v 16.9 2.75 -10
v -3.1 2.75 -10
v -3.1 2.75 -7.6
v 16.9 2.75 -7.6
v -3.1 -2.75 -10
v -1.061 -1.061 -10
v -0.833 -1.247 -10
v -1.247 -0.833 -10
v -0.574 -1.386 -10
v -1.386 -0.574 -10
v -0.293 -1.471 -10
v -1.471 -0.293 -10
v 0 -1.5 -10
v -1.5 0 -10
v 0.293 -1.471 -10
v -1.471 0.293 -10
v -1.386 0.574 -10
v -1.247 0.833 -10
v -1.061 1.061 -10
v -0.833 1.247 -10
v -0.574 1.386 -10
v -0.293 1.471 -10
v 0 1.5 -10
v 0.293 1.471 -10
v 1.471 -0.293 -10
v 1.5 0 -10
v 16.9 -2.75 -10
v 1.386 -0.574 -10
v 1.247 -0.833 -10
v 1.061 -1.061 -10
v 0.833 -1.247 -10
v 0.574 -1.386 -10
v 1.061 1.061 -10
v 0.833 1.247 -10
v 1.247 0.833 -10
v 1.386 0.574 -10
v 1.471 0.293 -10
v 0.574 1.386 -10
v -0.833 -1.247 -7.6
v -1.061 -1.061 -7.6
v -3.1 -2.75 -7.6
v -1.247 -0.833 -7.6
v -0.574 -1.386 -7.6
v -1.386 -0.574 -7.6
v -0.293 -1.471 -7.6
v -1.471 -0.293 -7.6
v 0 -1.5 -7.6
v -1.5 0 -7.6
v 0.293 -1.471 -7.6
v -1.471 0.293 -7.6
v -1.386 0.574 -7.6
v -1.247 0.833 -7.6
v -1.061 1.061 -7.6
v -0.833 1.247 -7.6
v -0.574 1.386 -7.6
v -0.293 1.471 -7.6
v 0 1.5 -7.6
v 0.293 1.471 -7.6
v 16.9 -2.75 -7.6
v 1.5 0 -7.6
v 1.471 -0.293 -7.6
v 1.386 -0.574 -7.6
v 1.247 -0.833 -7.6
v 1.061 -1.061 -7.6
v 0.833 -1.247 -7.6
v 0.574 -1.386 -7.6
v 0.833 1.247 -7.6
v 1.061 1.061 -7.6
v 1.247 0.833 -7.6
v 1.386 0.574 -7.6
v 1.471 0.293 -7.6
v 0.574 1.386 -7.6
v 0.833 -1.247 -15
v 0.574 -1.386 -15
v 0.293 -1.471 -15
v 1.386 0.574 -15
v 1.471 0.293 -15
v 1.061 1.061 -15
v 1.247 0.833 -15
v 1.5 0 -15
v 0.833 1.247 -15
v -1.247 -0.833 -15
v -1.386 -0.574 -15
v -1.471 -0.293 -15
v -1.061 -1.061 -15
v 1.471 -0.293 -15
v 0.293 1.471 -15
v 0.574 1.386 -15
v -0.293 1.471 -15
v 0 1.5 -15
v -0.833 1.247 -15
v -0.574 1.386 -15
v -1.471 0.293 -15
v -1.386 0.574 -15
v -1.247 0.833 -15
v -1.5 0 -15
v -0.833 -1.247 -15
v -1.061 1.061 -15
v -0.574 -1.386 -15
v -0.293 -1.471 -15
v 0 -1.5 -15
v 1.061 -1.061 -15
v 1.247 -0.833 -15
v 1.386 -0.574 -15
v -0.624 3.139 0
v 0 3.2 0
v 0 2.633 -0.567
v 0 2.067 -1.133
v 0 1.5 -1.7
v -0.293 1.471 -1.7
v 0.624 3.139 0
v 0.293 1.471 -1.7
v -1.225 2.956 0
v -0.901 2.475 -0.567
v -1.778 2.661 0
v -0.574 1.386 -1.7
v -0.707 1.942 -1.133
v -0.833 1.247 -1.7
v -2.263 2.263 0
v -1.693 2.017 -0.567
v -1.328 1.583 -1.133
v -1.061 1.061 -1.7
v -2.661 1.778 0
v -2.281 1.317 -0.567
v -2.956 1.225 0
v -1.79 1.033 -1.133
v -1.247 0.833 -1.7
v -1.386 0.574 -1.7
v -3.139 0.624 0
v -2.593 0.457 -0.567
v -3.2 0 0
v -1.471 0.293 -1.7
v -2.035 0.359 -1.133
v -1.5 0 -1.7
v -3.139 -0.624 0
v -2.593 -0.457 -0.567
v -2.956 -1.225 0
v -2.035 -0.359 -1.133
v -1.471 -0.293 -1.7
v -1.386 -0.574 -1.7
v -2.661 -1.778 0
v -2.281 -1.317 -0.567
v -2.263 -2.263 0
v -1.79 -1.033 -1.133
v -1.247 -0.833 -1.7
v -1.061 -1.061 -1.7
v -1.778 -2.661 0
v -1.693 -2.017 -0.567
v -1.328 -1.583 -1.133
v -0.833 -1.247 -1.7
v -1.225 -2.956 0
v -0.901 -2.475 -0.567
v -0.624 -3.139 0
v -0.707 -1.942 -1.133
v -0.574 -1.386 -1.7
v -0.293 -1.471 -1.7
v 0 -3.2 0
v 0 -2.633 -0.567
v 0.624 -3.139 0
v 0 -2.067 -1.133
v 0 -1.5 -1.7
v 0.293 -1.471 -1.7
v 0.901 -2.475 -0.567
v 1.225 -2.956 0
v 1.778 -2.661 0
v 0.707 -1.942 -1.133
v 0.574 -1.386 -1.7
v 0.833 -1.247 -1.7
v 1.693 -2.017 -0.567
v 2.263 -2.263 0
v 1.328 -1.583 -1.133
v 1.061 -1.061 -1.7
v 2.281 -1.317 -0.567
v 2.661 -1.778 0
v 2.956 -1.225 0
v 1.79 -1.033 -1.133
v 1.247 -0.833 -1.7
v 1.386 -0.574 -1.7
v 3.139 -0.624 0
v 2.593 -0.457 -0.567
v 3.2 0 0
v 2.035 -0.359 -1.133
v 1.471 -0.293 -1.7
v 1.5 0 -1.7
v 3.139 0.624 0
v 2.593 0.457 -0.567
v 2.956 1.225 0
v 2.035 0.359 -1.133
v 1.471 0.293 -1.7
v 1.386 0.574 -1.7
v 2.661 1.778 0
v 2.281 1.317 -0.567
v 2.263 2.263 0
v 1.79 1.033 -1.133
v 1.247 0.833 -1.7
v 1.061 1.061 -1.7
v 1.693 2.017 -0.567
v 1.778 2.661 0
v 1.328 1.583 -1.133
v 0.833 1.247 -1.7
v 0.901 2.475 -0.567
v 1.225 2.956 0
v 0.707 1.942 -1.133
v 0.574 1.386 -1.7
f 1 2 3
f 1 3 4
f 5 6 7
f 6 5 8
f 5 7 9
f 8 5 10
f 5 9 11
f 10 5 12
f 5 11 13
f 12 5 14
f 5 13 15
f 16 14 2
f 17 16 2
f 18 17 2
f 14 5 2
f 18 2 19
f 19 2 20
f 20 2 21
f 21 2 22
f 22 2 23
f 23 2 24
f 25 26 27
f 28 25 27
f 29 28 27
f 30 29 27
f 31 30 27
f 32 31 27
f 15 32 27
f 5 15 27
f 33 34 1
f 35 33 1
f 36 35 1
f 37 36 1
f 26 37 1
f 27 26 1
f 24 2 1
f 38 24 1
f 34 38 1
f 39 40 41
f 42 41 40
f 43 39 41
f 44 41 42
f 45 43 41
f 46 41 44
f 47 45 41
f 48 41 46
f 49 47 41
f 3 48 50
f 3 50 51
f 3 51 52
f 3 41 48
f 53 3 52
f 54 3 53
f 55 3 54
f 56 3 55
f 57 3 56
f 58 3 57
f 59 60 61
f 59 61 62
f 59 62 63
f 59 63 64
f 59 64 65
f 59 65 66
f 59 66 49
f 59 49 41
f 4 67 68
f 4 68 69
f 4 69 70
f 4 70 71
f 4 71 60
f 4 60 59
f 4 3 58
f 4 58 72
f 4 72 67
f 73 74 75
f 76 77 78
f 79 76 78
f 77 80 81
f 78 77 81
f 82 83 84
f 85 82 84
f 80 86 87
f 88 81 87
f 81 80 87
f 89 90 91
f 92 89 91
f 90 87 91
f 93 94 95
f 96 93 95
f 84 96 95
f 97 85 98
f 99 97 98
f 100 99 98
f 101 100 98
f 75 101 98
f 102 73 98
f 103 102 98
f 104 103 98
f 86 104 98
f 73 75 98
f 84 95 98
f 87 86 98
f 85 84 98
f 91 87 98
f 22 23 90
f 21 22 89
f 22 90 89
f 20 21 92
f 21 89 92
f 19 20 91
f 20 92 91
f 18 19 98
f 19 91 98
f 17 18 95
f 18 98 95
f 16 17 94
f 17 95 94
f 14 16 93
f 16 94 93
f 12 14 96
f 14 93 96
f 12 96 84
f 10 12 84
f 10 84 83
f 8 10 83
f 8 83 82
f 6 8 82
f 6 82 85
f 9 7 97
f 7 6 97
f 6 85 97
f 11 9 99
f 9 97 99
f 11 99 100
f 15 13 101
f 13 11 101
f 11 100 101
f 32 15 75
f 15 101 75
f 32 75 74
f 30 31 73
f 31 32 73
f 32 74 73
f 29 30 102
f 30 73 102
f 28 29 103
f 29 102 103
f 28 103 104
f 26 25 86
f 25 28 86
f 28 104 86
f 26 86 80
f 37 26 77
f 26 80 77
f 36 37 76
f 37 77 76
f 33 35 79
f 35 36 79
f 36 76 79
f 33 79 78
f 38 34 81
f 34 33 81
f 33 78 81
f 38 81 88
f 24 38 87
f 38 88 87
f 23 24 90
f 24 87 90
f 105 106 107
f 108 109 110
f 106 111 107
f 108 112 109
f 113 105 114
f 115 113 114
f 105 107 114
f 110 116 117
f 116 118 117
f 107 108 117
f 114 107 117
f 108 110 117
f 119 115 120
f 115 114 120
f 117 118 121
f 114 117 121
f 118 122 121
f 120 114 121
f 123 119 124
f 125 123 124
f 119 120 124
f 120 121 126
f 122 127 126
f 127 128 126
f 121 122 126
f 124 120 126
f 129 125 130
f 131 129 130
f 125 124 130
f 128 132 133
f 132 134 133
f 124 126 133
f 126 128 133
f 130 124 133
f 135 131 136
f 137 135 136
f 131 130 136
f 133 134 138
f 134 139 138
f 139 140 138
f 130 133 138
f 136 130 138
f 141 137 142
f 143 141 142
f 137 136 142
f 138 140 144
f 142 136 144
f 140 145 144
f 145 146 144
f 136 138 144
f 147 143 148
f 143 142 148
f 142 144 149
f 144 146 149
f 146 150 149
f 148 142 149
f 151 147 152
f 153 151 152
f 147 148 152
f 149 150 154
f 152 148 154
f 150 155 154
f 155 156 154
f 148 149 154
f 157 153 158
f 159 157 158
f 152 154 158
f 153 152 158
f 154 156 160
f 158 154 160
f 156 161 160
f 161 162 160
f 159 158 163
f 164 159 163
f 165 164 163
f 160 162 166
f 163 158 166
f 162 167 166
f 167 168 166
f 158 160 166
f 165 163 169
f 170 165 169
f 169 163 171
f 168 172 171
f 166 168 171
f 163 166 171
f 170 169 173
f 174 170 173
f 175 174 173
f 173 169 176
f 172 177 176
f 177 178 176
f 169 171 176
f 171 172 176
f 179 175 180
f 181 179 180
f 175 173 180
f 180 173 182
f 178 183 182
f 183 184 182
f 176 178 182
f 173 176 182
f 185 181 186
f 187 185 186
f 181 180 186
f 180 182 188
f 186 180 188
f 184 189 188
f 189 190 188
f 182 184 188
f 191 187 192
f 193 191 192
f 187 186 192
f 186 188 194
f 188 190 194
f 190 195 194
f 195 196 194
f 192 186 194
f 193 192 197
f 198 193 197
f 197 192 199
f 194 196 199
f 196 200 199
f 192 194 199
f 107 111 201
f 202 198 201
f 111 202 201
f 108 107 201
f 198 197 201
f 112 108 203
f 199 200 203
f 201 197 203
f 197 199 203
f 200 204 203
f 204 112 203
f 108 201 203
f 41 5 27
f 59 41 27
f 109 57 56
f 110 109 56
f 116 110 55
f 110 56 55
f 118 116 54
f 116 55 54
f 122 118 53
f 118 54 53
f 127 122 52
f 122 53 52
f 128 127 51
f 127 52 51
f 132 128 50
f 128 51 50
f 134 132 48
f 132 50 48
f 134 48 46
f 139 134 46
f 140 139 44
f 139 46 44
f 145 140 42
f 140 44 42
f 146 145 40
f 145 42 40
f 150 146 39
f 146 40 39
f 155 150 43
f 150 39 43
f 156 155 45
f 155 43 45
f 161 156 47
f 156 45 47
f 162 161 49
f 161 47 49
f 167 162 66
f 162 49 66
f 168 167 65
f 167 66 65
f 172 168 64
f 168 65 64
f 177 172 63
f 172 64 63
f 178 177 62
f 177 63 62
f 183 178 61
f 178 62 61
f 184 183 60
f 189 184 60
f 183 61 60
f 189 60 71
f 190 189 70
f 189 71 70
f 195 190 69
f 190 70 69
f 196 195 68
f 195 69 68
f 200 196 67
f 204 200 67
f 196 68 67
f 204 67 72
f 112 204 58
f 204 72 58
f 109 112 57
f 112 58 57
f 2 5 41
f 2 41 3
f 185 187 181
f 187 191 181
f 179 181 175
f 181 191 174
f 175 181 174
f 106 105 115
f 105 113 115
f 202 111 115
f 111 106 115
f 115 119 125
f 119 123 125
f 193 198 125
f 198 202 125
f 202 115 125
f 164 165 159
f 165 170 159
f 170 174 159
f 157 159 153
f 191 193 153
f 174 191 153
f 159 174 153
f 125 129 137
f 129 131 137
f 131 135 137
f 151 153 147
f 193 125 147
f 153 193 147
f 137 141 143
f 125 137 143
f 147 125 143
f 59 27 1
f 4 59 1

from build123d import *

# Parameters (mm, degrees)
BOX_W     = 20
BOX_H     = 5.5
BOX_DEPTH = 2.4


with BuildPart() as nutslot:
    # Box → Box (new body)
    with BuildSketch(Plane(origin=(-3.1, -2.75, -10), x_dir=(1, 0, 0), z_dir=(0, 0, 1))):
        with Locations((10, 2.75)):
            Rectangle(BOX_W, BOX_H)
    extrude(amount=BOX_DEPTH)


with BuildPart() as countersunkcut:
    # Sketch007 → Revolution001 (revolve)
    with BuildSketch(Plane.YZ):
        Polygon((3.2, 0), (1.5, -1.7), (1.5, -15), (0, -15), (0, 0), align=None)
    revolve(axis=Axis((0, 0, 0), (0, 0, 1)))

    # Fusion: union NutSlot
    add(nutslot.part)


solid = countersunkcut.part
